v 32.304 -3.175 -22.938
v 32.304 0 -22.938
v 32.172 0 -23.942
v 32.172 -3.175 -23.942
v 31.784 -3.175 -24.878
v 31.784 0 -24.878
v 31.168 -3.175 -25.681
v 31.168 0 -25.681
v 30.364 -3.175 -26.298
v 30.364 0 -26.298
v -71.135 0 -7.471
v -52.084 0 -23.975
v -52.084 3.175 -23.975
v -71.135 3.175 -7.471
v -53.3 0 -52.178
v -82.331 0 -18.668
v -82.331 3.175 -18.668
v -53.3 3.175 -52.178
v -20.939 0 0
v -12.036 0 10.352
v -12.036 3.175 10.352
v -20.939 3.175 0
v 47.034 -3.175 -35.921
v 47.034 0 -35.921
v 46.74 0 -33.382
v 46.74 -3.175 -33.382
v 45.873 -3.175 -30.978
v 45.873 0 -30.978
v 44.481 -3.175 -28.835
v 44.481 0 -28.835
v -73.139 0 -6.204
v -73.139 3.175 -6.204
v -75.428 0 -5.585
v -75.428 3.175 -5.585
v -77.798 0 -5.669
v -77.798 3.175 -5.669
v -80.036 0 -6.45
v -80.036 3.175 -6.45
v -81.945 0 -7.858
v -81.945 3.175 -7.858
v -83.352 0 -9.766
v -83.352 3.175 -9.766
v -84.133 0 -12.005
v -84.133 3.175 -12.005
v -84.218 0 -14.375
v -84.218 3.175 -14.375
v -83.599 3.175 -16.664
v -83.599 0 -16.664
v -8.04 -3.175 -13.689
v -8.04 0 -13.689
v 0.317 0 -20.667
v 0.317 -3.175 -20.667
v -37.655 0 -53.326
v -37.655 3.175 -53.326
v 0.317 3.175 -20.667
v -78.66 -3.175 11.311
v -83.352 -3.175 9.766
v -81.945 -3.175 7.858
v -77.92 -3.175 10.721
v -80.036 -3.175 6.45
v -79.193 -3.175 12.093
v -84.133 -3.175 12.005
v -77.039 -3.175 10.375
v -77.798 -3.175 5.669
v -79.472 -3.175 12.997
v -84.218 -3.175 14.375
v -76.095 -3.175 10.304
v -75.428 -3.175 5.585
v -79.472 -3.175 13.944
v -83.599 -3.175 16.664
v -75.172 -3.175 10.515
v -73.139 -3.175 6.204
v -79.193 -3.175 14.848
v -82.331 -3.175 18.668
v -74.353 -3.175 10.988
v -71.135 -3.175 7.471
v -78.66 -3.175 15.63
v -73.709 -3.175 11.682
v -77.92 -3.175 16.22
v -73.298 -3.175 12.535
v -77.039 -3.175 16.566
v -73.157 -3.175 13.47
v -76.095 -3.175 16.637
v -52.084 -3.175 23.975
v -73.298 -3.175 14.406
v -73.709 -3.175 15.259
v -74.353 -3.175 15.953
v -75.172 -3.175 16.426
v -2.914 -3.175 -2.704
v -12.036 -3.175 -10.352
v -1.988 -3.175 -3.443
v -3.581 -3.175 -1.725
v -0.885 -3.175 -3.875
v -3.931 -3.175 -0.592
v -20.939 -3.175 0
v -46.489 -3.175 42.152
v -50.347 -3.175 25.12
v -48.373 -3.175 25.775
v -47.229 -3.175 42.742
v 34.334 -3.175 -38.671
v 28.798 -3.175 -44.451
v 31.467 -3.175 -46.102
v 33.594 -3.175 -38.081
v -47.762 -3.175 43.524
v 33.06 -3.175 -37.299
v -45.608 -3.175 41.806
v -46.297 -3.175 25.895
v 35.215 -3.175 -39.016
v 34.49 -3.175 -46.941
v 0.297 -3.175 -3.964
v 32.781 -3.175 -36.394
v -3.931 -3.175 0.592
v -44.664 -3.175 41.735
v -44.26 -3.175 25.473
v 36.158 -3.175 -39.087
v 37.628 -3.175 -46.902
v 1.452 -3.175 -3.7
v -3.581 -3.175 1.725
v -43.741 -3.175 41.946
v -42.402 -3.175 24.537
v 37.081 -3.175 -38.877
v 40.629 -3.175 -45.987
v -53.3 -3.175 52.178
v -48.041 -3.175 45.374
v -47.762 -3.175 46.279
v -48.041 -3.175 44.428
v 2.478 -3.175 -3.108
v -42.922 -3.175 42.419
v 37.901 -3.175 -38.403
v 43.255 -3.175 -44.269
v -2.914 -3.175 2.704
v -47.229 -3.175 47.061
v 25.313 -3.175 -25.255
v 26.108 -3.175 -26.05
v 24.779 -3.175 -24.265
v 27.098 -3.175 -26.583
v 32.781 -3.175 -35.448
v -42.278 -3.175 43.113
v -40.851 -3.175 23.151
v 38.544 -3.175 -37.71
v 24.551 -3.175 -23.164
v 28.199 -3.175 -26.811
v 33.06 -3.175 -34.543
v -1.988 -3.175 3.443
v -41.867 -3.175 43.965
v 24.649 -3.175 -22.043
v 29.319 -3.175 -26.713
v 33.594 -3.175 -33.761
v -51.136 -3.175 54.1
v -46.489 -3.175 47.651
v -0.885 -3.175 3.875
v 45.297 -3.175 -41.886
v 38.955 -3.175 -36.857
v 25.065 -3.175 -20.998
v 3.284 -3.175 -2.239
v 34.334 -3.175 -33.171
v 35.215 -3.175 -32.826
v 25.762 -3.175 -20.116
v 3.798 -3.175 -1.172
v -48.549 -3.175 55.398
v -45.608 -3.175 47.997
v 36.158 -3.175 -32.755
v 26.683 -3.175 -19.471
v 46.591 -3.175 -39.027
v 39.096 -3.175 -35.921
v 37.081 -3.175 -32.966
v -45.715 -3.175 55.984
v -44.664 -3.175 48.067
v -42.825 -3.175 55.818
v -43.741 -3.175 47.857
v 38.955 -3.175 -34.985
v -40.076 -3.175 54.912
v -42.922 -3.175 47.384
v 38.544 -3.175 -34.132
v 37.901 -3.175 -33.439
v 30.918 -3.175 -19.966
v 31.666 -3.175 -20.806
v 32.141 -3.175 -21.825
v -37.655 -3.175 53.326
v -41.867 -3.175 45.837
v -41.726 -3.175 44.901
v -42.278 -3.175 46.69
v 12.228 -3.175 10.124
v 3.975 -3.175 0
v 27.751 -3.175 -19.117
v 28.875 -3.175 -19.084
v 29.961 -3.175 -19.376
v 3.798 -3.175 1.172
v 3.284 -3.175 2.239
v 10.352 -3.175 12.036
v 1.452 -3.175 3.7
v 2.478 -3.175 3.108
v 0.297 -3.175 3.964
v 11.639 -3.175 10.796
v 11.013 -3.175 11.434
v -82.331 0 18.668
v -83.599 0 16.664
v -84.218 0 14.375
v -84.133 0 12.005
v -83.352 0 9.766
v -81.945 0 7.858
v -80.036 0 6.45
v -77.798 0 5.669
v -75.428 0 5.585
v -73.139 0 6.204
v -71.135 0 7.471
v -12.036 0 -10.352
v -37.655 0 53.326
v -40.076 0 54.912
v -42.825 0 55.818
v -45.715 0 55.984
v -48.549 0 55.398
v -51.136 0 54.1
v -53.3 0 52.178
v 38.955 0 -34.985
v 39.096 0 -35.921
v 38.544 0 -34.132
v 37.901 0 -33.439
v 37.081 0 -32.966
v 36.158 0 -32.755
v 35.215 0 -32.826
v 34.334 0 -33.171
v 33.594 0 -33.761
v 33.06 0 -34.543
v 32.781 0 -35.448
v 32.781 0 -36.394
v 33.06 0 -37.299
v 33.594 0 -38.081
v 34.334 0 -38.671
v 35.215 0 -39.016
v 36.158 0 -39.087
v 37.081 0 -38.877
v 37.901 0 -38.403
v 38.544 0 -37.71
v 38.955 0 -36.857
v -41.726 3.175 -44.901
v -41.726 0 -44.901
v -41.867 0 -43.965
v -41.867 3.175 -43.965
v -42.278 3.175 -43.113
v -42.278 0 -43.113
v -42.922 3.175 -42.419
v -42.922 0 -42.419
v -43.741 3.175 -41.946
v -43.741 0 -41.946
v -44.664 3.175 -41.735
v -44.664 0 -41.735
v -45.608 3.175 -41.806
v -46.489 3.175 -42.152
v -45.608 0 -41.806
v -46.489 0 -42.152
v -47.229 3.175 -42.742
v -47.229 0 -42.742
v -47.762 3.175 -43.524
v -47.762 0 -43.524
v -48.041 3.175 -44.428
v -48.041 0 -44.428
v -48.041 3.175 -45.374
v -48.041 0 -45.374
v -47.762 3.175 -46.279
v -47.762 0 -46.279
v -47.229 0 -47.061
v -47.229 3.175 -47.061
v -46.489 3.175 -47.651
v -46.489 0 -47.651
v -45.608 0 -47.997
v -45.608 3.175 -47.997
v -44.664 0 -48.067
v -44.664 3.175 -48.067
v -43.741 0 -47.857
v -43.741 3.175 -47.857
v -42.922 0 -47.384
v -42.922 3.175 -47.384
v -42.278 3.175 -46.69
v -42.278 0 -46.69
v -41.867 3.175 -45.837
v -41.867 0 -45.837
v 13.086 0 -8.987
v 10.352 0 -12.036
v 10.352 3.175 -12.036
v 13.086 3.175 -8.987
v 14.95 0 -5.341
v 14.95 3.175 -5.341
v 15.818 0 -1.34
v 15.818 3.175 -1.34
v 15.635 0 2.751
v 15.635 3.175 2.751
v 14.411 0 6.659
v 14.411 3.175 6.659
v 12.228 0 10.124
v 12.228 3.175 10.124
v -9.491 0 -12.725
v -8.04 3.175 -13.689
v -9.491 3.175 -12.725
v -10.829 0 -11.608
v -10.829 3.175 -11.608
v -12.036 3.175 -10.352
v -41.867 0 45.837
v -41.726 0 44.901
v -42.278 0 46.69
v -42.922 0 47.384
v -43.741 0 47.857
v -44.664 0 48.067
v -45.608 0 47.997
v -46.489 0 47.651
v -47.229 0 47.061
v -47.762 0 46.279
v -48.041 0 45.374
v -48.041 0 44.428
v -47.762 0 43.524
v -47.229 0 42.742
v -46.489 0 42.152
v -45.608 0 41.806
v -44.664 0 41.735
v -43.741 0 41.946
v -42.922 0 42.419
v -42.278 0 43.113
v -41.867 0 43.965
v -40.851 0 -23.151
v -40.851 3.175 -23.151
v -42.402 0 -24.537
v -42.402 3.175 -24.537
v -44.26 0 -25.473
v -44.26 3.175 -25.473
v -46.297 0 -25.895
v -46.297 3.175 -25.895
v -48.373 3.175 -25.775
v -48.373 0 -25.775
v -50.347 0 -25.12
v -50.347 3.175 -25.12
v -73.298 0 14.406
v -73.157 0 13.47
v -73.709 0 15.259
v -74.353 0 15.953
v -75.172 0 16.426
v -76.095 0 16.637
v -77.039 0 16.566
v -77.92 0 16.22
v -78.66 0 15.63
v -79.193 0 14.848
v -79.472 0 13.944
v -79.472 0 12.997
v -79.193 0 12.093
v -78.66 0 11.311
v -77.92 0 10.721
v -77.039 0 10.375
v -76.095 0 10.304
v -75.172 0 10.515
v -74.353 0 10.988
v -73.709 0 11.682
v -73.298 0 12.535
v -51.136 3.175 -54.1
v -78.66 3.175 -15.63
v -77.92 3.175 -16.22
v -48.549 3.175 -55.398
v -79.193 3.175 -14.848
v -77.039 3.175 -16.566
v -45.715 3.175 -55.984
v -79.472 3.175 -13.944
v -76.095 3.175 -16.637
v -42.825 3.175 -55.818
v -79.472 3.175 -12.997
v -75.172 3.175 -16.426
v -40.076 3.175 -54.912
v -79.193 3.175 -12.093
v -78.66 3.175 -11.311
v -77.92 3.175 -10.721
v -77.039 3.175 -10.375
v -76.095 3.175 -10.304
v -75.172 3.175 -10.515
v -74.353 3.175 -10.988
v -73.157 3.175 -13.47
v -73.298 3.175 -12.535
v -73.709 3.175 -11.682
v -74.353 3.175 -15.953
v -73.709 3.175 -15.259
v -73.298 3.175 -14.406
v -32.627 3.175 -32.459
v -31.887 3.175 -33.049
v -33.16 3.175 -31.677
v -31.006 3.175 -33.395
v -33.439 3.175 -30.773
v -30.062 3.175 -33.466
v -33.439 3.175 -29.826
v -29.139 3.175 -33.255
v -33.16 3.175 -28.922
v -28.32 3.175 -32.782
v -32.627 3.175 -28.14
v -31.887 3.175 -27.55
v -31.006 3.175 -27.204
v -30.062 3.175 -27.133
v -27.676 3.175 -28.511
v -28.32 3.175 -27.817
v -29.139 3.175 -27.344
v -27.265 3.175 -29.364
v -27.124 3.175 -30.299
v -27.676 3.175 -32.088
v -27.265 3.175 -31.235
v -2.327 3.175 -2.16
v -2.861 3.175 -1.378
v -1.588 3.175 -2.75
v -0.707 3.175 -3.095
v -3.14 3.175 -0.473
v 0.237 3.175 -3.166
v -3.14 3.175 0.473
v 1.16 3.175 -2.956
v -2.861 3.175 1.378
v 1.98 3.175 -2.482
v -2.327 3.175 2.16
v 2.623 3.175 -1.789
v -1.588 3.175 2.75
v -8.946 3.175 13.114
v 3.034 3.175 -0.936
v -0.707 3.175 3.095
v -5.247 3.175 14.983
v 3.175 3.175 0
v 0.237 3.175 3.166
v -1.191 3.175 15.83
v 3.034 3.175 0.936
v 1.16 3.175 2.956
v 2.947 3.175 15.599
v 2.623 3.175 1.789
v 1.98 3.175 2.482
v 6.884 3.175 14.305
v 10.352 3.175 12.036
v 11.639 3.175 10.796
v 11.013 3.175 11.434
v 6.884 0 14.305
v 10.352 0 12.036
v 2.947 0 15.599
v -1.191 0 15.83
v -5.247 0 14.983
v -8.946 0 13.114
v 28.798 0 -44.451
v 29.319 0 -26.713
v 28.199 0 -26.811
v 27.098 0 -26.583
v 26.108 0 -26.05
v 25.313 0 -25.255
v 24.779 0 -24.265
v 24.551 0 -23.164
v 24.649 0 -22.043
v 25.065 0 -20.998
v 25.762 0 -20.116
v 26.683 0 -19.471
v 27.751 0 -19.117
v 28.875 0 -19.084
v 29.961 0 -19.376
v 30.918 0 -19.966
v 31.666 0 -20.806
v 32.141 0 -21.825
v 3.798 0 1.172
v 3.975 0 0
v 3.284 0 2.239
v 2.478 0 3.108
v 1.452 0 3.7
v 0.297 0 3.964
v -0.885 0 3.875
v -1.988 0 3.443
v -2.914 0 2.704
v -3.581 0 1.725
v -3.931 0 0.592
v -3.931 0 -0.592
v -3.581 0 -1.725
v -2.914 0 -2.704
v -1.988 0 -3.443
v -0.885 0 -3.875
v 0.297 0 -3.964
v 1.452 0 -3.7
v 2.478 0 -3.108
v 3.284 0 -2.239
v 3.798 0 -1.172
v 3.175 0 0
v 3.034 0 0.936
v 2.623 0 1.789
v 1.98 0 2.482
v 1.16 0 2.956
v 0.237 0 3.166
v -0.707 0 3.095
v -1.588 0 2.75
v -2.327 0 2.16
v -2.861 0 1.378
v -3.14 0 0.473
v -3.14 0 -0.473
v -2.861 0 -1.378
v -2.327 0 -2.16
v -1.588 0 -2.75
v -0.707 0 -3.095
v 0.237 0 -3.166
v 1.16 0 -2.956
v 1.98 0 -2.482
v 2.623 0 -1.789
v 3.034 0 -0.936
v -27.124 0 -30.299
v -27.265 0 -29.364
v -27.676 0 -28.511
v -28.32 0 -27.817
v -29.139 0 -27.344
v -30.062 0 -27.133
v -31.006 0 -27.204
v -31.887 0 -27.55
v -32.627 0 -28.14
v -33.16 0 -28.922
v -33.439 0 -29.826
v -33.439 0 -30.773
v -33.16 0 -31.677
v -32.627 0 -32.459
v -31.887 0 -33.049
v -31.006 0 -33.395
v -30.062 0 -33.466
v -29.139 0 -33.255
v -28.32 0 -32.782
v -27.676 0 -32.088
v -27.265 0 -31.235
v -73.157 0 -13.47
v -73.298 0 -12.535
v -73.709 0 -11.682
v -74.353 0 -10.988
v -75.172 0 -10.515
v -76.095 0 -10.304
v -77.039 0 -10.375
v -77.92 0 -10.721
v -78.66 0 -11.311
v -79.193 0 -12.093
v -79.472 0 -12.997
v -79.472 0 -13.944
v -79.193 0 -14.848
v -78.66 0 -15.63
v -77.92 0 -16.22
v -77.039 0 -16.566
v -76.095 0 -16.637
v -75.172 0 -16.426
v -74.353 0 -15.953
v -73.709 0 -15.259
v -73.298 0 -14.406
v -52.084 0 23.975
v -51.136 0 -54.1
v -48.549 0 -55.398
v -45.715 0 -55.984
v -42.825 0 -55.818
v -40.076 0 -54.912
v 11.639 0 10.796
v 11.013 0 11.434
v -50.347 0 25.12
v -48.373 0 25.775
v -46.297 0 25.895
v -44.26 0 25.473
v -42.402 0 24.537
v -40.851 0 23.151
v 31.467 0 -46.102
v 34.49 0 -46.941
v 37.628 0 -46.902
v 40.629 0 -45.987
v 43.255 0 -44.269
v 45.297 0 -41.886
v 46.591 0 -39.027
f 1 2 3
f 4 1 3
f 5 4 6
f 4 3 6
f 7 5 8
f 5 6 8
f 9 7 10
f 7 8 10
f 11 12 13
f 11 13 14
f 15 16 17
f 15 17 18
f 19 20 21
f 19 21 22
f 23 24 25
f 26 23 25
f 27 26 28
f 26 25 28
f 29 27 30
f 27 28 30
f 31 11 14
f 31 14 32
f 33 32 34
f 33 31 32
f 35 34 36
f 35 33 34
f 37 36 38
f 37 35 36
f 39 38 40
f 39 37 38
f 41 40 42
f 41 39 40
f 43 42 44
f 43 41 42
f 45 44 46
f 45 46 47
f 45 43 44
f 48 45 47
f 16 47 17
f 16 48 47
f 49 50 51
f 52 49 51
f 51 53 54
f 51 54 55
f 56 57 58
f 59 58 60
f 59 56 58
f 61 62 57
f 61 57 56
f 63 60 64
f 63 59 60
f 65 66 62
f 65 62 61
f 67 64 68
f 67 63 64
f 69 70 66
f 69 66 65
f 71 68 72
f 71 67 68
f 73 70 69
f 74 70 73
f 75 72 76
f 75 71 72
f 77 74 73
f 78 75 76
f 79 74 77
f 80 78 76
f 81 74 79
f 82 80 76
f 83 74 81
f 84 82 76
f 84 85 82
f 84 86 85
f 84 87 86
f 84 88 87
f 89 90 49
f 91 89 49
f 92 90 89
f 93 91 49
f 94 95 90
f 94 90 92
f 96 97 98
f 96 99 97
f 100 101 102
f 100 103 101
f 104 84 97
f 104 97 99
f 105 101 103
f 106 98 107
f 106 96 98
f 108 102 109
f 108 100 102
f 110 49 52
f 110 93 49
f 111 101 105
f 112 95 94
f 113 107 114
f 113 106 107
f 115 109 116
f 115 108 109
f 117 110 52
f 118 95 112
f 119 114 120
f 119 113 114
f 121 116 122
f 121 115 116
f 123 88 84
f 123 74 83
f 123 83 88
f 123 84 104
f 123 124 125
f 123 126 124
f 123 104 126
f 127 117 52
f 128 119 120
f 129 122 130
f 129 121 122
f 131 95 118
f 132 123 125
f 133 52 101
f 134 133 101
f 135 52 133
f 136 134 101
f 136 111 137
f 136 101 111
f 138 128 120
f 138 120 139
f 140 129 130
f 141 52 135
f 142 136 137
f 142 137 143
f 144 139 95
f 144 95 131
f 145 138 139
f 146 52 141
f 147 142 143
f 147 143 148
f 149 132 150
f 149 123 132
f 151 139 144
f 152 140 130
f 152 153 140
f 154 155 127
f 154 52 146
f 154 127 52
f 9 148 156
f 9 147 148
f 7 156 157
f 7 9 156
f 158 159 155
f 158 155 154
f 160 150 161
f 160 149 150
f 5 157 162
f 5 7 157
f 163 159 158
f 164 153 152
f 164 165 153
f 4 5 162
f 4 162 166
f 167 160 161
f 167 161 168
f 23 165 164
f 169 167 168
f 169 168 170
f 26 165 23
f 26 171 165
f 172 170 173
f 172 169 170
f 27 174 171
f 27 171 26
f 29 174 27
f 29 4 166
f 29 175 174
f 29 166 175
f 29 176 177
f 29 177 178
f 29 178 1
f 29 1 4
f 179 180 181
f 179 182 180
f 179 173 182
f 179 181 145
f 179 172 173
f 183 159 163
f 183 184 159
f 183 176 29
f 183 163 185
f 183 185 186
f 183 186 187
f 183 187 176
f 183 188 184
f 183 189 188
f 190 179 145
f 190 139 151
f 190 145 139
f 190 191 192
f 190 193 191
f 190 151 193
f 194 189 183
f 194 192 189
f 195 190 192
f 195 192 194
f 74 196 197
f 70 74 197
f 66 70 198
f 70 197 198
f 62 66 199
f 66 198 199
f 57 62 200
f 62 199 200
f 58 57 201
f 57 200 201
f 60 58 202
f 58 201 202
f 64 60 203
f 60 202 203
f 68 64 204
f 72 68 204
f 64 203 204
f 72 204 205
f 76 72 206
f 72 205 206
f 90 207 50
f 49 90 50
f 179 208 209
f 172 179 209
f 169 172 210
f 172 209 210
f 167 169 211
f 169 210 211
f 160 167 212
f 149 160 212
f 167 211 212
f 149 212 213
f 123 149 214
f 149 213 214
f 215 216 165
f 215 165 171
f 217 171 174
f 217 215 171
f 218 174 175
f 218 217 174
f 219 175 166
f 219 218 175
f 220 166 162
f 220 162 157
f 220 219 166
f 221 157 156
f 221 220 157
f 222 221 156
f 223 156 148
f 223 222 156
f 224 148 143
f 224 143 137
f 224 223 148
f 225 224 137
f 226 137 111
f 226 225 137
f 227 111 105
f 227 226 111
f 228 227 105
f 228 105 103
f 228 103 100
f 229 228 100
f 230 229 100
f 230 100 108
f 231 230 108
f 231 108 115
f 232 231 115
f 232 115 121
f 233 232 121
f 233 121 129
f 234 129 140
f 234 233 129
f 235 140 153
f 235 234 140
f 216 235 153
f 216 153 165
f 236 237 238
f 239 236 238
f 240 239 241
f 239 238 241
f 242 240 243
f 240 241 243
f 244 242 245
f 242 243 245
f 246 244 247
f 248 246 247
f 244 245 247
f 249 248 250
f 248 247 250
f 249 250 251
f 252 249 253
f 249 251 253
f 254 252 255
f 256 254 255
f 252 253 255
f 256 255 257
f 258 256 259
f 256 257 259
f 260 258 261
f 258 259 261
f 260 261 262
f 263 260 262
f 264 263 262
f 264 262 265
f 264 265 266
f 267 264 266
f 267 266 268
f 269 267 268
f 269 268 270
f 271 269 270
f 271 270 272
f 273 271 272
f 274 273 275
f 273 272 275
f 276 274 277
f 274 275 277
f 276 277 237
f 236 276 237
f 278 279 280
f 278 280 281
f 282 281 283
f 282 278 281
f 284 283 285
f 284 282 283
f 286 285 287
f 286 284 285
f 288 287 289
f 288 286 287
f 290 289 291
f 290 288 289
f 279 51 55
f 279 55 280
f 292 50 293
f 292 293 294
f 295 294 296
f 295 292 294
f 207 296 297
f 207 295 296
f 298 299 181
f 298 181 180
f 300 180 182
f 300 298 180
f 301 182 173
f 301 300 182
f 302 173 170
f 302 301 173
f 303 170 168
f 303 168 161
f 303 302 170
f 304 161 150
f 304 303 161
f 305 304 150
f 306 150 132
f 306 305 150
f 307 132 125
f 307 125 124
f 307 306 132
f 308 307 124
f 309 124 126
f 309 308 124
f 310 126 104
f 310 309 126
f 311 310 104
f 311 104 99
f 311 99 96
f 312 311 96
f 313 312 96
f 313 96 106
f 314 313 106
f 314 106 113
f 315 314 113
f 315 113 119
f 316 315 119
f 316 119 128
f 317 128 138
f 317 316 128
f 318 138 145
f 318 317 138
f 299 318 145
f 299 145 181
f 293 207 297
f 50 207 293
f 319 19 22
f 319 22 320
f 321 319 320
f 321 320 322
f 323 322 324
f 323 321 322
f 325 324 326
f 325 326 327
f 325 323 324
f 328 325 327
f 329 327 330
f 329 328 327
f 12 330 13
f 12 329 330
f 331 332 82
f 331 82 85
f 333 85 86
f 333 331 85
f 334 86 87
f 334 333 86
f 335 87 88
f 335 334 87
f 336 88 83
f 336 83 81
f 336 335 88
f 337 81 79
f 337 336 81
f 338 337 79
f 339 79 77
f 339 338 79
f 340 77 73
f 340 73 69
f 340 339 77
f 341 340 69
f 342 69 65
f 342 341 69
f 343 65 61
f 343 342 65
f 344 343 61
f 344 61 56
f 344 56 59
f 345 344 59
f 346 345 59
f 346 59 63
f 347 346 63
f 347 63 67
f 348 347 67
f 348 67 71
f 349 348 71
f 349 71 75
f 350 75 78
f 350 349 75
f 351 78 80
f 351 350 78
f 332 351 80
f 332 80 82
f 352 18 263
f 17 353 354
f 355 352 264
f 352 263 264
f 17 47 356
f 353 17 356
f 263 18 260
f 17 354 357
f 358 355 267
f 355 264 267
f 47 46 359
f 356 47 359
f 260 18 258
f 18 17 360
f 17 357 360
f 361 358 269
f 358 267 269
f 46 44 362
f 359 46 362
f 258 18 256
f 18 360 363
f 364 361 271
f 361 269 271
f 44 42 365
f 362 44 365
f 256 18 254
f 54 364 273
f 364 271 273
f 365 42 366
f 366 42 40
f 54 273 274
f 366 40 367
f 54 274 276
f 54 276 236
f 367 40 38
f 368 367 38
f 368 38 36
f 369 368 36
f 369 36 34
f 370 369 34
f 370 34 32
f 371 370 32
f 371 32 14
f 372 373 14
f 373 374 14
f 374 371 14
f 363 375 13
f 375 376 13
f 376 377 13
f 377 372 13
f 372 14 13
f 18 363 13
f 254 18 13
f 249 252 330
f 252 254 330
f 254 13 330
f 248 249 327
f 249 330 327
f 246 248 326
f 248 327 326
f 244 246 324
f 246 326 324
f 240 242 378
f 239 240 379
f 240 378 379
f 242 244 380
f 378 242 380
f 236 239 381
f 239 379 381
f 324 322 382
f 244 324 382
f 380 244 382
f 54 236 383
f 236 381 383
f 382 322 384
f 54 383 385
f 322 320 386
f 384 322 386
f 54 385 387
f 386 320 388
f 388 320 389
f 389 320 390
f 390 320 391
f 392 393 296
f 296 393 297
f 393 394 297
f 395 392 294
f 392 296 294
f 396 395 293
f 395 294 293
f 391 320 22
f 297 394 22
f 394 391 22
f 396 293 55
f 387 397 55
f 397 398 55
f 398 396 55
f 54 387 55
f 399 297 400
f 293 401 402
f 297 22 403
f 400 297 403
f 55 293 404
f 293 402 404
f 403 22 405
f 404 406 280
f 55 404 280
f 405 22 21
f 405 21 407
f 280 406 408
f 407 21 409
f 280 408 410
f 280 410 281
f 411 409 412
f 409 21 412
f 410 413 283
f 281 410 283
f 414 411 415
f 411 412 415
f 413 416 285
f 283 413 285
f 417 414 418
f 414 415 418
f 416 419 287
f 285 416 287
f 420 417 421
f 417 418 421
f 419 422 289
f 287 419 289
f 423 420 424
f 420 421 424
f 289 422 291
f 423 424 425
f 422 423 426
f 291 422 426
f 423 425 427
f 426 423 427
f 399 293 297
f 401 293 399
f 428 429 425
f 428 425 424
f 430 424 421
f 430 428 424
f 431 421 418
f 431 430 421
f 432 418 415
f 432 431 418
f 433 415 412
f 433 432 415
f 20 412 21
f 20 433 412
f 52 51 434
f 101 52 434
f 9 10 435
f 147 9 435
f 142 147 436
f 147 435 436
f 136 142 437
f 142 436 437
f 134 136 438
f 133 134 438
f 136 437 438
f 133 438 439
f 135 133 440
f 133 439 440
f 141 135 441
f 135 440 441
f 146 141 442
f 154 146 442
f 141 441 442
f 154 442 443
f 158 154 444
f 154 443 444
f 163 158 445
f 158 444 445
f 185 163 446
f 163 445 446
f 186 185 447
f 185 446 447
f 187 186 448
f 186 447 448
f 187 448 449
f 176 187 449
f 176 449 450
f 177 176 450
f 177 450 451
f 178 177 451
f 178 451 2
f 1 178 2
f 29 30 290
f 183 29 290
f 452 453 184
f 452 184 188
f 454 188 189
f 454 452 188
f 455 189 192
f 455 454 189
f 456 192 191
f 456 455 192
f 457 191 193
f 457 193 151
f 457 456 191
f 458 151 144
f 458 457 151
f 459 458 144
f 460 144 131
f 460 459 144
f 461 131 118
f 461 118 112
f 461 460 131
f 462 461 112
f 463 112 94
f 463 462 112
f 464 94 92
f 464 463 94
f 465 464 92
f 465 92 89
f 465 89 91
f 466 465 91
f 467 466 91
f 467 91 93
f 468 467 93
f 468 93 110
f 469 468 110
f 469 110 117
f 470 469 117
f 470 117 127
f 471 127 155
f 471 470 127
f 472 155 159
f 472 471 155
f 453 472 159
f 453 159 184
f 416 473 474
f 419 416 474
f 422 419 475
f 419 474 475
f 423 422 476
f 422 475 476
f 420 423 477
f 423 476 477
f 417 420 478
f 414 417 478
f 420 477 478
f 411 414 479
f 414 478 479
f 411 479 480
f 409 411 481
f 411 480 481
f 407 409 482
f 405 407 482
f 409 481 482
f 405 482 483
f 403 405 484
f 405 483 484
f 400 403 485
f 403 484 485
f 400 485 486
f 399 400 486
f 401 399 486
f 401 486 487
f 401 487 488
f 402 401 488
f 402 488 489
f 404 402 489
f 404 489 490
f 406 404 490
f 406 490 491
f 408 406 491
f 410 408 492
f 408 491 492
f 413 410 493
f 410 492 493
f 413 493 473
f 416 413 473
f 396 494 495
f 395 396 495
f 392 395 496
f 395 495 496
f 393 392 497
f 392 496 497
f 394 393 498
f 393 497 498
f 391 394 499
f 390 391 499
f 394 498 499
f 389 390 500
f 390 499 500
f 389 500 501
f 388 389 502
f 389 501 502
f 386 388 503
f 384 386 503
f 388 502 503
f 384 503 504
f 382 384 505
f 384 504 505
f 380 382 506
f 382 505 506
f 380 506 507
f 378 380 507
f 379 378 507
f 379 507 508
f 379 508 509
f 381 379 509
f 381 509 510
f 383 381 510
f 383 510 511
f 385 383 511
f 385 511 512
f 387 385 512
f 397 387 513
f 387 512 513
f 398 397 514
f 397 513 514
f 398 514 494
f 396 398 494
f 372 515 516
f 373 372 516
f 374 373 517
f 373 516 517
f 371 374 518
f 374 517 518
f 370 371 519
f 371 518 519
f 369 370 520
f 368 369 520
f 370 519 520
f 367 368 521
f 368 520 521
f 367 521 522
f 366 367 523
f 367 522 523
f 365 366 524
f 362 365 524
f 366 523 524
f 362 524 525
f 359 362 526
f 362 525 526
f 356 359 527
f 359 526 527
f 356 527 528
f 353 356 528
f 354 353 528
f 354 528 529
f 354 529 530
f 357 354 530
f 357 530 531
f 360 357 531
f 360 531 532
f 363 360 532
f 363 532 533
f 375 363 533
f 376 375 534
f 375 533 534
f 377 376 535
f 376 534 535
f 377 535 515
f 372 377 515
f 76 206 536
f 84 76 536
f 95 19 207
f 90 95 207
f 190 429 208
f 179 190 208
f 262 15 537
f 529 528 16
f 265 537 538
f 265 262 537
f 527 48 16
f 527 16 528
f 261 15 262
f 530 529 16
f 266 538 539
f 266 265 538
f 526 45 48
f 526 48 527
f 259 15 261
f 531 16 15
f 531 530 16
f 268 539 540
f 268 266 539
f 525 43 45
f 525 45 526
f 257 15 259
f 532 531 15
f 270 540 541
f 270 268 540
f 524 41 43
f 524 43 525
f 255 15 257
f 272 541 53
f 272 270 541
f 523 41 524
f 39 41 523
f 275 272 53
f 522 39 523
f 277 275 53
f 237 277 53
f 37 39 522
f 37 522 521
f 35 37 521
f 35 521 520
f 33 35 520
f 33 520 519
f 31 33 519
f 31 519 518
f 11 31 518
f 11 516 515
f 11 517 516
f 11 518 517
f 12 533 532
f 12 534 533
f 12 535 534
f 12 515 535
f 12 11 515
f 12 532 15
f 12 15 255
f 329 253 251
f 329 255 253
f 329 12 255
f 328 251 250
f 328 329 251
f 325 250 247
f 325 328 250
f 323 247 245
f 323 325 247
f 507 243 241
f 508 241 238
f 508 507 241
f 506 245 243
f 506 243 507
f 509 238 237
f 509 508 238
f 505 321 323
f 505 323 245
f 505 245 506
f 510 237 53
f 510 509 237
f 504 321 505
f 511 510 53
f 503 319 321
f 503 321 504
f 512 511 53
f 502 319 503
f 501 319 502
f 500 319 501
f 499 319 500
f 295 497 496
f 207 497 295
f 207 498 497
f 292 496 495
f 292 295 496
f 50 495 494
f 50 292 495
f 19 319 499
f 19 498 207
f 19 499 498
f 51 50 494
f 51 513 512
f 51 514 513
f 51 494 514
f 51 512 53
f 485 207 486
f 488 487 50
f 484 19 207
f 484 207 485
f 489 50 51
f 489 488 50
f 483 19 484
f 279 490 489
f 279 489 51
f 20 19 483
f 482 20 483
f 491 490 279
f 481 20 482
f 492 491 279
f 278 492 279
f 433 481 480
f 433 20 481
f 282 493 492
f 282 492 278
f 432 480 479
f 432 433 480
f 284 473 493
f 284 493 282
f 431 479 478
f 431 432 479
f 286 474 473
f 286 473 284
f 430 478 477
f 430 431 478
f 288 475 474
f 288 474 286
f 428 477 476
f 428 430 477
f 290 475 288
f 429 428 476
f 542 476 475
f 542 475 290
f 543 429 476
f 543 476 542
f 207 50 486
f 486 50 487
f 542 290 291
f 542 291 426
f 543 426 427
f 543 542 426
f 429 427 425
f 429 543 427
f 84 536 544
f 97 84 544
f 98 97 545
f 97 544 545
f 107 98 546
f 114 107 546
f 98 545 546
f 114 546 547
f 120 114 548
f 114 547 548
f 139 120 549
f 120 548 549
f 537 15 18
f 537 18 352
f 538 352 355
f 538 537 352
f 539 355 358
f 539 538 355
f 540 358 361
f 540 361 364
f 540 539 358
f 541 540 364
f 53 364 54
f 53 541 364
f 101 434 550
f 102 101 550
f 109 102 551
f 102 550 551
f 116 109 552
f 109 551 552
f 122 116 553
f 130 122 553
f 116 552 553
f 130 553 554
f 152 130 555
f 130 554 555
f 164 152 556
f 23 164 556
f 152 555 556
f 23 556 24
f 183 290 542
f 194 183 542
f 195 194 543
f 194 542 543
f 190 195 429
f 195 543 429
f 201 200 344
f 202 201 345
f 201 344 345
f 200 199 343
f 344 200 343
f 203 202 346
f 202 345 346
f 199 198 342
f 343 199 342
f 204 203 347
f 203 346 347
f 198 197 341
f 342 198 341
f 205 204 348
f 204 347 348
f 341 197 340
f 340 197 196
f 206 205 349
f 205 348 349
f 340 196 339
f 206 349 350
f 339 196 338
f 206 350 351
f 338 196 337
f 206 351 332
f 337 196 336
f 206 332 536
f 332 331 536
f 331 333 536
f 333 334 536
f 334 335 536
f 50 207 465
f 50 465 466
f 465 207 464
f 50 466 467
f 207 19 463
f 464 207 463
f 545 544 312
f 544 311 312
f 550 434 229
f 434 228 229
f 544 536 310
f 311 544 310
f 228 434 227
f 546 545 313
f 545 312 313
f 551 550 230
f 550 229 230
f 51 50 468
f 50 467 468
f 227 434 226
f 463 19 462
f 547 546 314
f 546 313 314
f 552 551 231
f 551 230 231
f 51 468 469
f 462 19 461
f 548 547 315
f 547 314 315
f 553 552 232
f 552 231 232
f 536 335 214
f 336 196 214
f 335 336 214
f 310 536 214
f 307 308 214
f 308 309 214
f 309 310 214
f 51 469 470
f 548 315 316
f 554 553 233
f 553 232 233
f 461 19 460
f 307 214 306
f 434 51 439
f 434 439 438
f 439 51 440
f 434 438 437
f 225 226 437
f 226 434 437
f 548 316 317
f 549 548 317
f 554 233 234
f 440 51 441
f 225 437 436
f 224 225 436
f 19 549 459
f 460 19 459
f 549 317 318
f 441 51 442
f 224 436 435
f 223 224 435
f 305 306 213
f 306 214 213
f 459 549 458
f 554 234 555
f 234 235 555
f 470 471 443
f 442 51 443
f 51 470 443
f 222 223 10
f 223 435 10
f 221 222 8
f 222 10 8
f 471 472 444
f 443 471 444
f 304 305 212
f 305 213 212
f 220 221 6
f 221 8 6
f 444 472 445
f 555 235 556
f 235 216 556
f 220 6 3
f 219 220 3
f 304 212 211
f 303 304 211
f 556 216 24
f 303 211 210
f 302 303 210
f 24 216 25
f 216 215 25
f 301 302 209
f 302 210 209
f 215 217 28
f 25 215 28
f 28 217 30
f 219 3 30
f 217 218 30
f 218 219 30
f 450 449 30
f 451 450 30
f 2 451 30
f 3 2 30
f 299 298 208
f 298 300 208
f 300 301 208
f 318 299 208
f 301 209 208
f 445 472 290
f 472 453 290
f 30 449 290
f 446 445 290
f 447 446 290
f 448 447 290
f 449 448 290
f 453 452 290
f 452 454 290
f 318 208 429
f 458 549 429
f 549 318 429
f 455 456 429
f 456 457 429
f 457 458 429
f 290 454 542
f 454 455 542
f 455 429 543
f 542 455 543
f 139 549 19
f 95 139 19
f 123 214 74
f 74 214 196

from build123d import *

# Parameters (mm, degrees)
F0_R     = 3.175
F0_R_2   = 3.9751
F1_DEPTH = 3.175
F2_DEPTH = 3.175


with BuildPart() as f1:
    # F0 (on Front) → F1 (new body)
    with BuildSketch(Plane.XZ):
        with BuildLine():
            ThreePointArc((-82.331405076, 18.6678036462), (-73.5586383483, 20.9075469092), (-68.3946770291, 13.4703841816))
            ThreePointArc((-68.3946770291, 13.4703841816), (-69.1121208226, 10.1727039932), (-71.1347575644, 7.4711561347))
            Line((-71.1347575644, 7.4711561347), (-52.0843267669, 23.9754595323))
            ThreePointArc((-52.0843267669, 23.9754595323), (-46.2965222838, 25.8954961667), (-40.8511612346, 23.1508168672))
            Line((-40.8511612346, 23.1508168672), (-20.9391765456, 0))
            Line((-20.9391765456, 0), (-12.0356033222, 10.3518055271))
            ThreePointArc((-12.0356033222, 10.3518055271), (-1.1906249195, 15.8302886045), (10.3518054047, 12.0356034274))
            Line((10.3518054047, 12.0356034274), (-37.655016822, 53.3262030046))
            ThreePointArc((-37.655016822, 53.3262030046), (-34.8014845049, 49.5361241819), (-33.7887806053, 44.9012806053))
            ThreePointArc((-33.7887806053, 44.9012806053), (-48.7842347585, 34.4892527868), (-53.300199871, 52.1776678558))
            Line((-53.300199871, 52.1776678558), (-82.331405076, 18.6678036462))
        make_face()
        with BuildLine():
            ThreePointArc((-37.655016822, 53.3262030046), (-45.7148756595, 55.9839571475), (-53.300199871, 52.1776678558))
            ThreePointArc((-53.300199871, 52.1776678558), (-48.7842347585, 34.4892527868), (-33.7887806053, 44.9012806053))
            ThreePointArc((-33.7887806053, 44.9012806053), (-34.8014845049, 49.5361241819), (-37.655016822, 53.3262030046))
        make_face()
        with Locations((-44.9012806053, 44.9012806053)):
            Circle(F0_R, mode=Mode.SUBTRACT)
        with BuildLine():
            ThreePointArc((-71.1347575644, 7.4711561347), (-69.1121208226, 10.1727039932), (-68.3946770291, 13.4703841816))
            ThreePointArc((-68.3946770291, 13.4703841816), (-73.5586383483, 20.9075469092), (-82.331405076, 18.6678036462))
            ThreePointArc((-82.331405076, 18.6678036462), (-81.9448371048, 7.8577241059), (-71.1347575644, 7.4711561347))
        make_face()
        with Locations((-76.3321770291, 13.4703841816)):
            Circle(F0_R, mode=Mode.SUBTRACT)
        with BuildLine():
            ThreePointArc((12.2282550252, 10.1235074968), (11.3304373246, 11.1192092809), (10.3518054047, 12.0356034274))
            ThreePointArc((10.3518054047, 12.0356034274), (-1.1906249195, 15.8302886045), (-12.0356033222, 10.3518055271))
            ThreePointArc((-12.0356033222, 10.3518055271), (-15.875, 8.07e-08), (-12.0356034274, -10.3518054047))
            Line((-12.0356034274, -10.3518054047), (-8.0396721793, -13.6886557503))
            ThreePointArc((-8.0396721793, -13.6886557503), (1.4211385228, -15.8112615025), (10.3518049721, -12.0356037995))
            ThreePointArc((10.3518049721, -12.0356037995), (14.4282800245, -6.6212053686), (15.875, 0))
            ThreePointArc((15.875, 0), (14.9355142785, 5.3801522504), (12.2282550252, 10.1235074968))
        make_face()
        Circle(F0_R_2, mode=Mode.SUBTRACT)
        with BuildLine():
            ThreePointArc((47.0335244843, -35.9210244843), (46.3758844792, -32.154917909), (44.4808030019, -28.8345692365))
            ThreePointArc((44.4808030019, -28.8345692365), (37.8866667262, -24.9837530317), (30.3643454707, -26.2975648886))
            ThreePointArc((30.3643454707, -26.2975648886), (24.8496477325, -34.9658946135), (28.7982771588, -44.4506274521))
            ThreePointArc((28.7982771588, -44.4506274521), (40.6293217665, -45.9867878906), (47.0335244843, -35.9210244843))
        make_face()
        with Locations((35.9210244843, -35.9210244843)):
            Circle(F0_R, mode=Mode.SUBTRACT)
        with BuildLine():
            Line((44.4808030019, -28.8345692365), (12.2282550252, 10.1235074968))
            ThreePointArc((12.2282550252, 10.1235074968), (14.9355142785, 5.3801522504), (15.875, 0))
            ThreePointArc((15.875, 0), (14.4282800245, -6.6212053686), (10.3518049721, -12.0356037995))
            Line((10.3518049721, -12.0356037995), (0.316722829, -20.6667636904))
            Line((0.316722829, -20.6667636904), (28.7982771588, -44.4506274521))
            ThreePointArc((28.7982771588, -44.4506274521), (24.8496477325, -34.9658946135), (30.3643454707, -26.2975648886))
            ThreePointArc((30.3643454707, -26.2975648886), (37.8866667262, -24.9837530317), (44.4808030019, -28.8345692365))
        make_face()
        with BuildLine():
            ThreePointArc((32.3039927423, -22.9378244059), (31.7842689248, -24.8775465283), (30.3643454707, -26.2975648886))
            ThreePointArc((30.3643454707, -26.2975648886), (25.064528655, -20.9981022834), (32.3039927423, -22.9378244059))
        make_face(mode=Mode.SUBTRACT)
        with BuildLine():
            Line((-12.0356033222, 10.3518055271), (-20.9391765456, 0))
            Line((-20.9391765456, 0), (-12.0356034274, -10.3518054047))
            ThreePointArc((-12.0356034274, -10.3518054047), (-15.875, 8.07e-08), (-12.0356033222, 10.3518055271))
        make_face()
        with BuildLine():
            ThreePointArc((10.3518049721, -12.0356037995), (1.4211385228, -15.8112615025), (-8.0396721793, -13.6886557503))
            Line((-8.0396721793, -13.6886557503), (0.316722829, -20.6667636904))
            Line((0.316722829, -20.6667636904), (10.3518049721, -12.0356037995))
        make_face()
    extrude(amount=F1_DEPTH)


with BuildPart() as f2:
    # F0 (on Front) → F2 (new body)
    with BuildSketch(Plane.XZ):
        with BuildLine():
            Line((-12.0356034274, -10.3518054047), (-20.9391765456, 0))
            Line((-20.9391765456, 0), (-40.8511612346, -23.1508168672))
            ThreePointArc((-40.8511612346, -23.1508168672), (-46.2965222838, -25.8954961667), (-52.0843267669, -23.9754595323))
            Line((-52.0843267669, -23.9754595323), (-71.1347575644, -7.4711561347))
            ThreePointArc((-71.1347575644, -7.4711561347), (-69.1121208226, -10.1727039932), (-68.3946770291, -13.4703841816))
            ThreePointArc((-68.3946770291, -13.4703841816), (-73.5586383483, -20.9075469092), (-82.331405076, -18.6678036462))
            Line((-82.331405076, -18.6678036462), (-53.300199871, -52.1776678559))
            ThreePointArc((-53.300199871, -52.1776678559), (-48.7842347585, -34.4892527868), (-33.7887806053, -44.9012806053))
            ThreePointArc((-33.7887806053, -44.9012806053), (-34.8014845049, -49.5361241819), (-37.655016822, -53.3262030046))
            Line((-37.655016822, -53.3262030046), (0.316722829, -20.6667636904))
            Line((0.316722829, -20.6667636904), (-8.0396721793, -13.6886557503))
            ThreePointArc((-8.0396721793, -13.6886557503), (-10.175353322, -12.1851470968), (-12.0356034274, -10.3518054047))
        make_face()
        with Locations((-30.2993841525, -30.2993841525)):
            Circle(F0_R, mode=Mode.SUBTRACT)
        with BuildLine():
            ThreePointArc((-53.300199871, -52.1776678559), (-45.7148756595, -55.9839571475), (-37.655016822, -53.3262030046))
            ThreePointArc((-37.655016822, -53.3262030046), (-34.8014845049, -49.5361241819), (-33.7887806053, -44.9012806053))
            ThreePointArc((-33.7887806053, -44.9012806053), (-48.7842347585, -34.4892527868), (-53.300199871, -52.1776678559))
        make_face()
        with Locations((-44.9012806053, -44.9012806053)):
            Circle(F0_R, mode=Mode.SUBTRACT)
        with BuildLine():
            ThreePointArc((-68.3946770291, -13.4703841816), (-69.1121208226, -10.1727039932), (-71.1347575644, -7.4711561347))
            ThreePointArc((-71.1347575644, -7.4711561347), (-81.9448371048, -7.8577241059), (-82.331405076, -18.6678036462))
            ThreePointArc((-82.331405076, -18.6678036462), (-73.5586383483, -20.9075469092), (-68.3946770291, -13.4703841816))
        make_face()
        with Locations((-76.3321770291, -13.4703841816)):
            Circle(F0_R, mode=Mode.SUBTRACT)
        with BuildLine():
            ThreePointArc((10.3518049721, -12.0356037995), (1.4211385228, -15.8112615025), (-8.0396721793, -13.6886557503))
            Line((-8.0396721793, -13.6886557503), (0.316722829, -20.6667636904))
            Line((0.316722829, -20.6667636904), (10.3518049721, -12.0356037995))
        make_face()
        with BuildLine():
            Line((-12.0356033222, 10.3518055271), (-20.9391765456, 0))
            Line((-20.9391765456, 0), (-12.0356034274, -10.3518054047))
            ThreePointArc((-12.0356034274, -10.3518054047), (-15.875, 8.07e-08), (-12.0356033222, 10.3518055271))
        make_face()
        with BuildLine():
            ThreePointArc((12.2282550252, 10.1235074968), (11.3304373246, 11.1192092809), (10.3518054047, 12.0356034274))
            ThreePointArc((10.3518054047, 12.0356034274), (-1.1906249195, 15.8302886045), (-12.0356033222, 10.3518055271))
            ThreePointArc((-12.0356033222, 10.3518055271), (-15.875, 8.07e-08), (-12.0356034274, -10.3518054047))
            Line((-12.0356034274, -10.3518054047), (-8.0396721793, -13.6886557503))
            ThreePointArc((-8.0396721793, -13.6886557503), (1.4211385228, -15.8112615025), (10.3518049721, -12.0356037995))
            ThreePointArc((10.3518049721, -12.0356037995), (14.4282800245, -6.6212053686), (15.875, 0))
            ThreePointArc((15.875, 0), (14.9355142785, 5.3801522504), (12.2282550252, 10.1235074968))
        make_face()
        Circle(F0_R_2, mode=Mode.SUBTRACT)
        Circle(F0_R_2)
        Circle(F0_R, mode=Mode.SUBTRACT)
    extrude(amount=-F2_DEPTH)


solid = Compound([f1.part, f2.part])
